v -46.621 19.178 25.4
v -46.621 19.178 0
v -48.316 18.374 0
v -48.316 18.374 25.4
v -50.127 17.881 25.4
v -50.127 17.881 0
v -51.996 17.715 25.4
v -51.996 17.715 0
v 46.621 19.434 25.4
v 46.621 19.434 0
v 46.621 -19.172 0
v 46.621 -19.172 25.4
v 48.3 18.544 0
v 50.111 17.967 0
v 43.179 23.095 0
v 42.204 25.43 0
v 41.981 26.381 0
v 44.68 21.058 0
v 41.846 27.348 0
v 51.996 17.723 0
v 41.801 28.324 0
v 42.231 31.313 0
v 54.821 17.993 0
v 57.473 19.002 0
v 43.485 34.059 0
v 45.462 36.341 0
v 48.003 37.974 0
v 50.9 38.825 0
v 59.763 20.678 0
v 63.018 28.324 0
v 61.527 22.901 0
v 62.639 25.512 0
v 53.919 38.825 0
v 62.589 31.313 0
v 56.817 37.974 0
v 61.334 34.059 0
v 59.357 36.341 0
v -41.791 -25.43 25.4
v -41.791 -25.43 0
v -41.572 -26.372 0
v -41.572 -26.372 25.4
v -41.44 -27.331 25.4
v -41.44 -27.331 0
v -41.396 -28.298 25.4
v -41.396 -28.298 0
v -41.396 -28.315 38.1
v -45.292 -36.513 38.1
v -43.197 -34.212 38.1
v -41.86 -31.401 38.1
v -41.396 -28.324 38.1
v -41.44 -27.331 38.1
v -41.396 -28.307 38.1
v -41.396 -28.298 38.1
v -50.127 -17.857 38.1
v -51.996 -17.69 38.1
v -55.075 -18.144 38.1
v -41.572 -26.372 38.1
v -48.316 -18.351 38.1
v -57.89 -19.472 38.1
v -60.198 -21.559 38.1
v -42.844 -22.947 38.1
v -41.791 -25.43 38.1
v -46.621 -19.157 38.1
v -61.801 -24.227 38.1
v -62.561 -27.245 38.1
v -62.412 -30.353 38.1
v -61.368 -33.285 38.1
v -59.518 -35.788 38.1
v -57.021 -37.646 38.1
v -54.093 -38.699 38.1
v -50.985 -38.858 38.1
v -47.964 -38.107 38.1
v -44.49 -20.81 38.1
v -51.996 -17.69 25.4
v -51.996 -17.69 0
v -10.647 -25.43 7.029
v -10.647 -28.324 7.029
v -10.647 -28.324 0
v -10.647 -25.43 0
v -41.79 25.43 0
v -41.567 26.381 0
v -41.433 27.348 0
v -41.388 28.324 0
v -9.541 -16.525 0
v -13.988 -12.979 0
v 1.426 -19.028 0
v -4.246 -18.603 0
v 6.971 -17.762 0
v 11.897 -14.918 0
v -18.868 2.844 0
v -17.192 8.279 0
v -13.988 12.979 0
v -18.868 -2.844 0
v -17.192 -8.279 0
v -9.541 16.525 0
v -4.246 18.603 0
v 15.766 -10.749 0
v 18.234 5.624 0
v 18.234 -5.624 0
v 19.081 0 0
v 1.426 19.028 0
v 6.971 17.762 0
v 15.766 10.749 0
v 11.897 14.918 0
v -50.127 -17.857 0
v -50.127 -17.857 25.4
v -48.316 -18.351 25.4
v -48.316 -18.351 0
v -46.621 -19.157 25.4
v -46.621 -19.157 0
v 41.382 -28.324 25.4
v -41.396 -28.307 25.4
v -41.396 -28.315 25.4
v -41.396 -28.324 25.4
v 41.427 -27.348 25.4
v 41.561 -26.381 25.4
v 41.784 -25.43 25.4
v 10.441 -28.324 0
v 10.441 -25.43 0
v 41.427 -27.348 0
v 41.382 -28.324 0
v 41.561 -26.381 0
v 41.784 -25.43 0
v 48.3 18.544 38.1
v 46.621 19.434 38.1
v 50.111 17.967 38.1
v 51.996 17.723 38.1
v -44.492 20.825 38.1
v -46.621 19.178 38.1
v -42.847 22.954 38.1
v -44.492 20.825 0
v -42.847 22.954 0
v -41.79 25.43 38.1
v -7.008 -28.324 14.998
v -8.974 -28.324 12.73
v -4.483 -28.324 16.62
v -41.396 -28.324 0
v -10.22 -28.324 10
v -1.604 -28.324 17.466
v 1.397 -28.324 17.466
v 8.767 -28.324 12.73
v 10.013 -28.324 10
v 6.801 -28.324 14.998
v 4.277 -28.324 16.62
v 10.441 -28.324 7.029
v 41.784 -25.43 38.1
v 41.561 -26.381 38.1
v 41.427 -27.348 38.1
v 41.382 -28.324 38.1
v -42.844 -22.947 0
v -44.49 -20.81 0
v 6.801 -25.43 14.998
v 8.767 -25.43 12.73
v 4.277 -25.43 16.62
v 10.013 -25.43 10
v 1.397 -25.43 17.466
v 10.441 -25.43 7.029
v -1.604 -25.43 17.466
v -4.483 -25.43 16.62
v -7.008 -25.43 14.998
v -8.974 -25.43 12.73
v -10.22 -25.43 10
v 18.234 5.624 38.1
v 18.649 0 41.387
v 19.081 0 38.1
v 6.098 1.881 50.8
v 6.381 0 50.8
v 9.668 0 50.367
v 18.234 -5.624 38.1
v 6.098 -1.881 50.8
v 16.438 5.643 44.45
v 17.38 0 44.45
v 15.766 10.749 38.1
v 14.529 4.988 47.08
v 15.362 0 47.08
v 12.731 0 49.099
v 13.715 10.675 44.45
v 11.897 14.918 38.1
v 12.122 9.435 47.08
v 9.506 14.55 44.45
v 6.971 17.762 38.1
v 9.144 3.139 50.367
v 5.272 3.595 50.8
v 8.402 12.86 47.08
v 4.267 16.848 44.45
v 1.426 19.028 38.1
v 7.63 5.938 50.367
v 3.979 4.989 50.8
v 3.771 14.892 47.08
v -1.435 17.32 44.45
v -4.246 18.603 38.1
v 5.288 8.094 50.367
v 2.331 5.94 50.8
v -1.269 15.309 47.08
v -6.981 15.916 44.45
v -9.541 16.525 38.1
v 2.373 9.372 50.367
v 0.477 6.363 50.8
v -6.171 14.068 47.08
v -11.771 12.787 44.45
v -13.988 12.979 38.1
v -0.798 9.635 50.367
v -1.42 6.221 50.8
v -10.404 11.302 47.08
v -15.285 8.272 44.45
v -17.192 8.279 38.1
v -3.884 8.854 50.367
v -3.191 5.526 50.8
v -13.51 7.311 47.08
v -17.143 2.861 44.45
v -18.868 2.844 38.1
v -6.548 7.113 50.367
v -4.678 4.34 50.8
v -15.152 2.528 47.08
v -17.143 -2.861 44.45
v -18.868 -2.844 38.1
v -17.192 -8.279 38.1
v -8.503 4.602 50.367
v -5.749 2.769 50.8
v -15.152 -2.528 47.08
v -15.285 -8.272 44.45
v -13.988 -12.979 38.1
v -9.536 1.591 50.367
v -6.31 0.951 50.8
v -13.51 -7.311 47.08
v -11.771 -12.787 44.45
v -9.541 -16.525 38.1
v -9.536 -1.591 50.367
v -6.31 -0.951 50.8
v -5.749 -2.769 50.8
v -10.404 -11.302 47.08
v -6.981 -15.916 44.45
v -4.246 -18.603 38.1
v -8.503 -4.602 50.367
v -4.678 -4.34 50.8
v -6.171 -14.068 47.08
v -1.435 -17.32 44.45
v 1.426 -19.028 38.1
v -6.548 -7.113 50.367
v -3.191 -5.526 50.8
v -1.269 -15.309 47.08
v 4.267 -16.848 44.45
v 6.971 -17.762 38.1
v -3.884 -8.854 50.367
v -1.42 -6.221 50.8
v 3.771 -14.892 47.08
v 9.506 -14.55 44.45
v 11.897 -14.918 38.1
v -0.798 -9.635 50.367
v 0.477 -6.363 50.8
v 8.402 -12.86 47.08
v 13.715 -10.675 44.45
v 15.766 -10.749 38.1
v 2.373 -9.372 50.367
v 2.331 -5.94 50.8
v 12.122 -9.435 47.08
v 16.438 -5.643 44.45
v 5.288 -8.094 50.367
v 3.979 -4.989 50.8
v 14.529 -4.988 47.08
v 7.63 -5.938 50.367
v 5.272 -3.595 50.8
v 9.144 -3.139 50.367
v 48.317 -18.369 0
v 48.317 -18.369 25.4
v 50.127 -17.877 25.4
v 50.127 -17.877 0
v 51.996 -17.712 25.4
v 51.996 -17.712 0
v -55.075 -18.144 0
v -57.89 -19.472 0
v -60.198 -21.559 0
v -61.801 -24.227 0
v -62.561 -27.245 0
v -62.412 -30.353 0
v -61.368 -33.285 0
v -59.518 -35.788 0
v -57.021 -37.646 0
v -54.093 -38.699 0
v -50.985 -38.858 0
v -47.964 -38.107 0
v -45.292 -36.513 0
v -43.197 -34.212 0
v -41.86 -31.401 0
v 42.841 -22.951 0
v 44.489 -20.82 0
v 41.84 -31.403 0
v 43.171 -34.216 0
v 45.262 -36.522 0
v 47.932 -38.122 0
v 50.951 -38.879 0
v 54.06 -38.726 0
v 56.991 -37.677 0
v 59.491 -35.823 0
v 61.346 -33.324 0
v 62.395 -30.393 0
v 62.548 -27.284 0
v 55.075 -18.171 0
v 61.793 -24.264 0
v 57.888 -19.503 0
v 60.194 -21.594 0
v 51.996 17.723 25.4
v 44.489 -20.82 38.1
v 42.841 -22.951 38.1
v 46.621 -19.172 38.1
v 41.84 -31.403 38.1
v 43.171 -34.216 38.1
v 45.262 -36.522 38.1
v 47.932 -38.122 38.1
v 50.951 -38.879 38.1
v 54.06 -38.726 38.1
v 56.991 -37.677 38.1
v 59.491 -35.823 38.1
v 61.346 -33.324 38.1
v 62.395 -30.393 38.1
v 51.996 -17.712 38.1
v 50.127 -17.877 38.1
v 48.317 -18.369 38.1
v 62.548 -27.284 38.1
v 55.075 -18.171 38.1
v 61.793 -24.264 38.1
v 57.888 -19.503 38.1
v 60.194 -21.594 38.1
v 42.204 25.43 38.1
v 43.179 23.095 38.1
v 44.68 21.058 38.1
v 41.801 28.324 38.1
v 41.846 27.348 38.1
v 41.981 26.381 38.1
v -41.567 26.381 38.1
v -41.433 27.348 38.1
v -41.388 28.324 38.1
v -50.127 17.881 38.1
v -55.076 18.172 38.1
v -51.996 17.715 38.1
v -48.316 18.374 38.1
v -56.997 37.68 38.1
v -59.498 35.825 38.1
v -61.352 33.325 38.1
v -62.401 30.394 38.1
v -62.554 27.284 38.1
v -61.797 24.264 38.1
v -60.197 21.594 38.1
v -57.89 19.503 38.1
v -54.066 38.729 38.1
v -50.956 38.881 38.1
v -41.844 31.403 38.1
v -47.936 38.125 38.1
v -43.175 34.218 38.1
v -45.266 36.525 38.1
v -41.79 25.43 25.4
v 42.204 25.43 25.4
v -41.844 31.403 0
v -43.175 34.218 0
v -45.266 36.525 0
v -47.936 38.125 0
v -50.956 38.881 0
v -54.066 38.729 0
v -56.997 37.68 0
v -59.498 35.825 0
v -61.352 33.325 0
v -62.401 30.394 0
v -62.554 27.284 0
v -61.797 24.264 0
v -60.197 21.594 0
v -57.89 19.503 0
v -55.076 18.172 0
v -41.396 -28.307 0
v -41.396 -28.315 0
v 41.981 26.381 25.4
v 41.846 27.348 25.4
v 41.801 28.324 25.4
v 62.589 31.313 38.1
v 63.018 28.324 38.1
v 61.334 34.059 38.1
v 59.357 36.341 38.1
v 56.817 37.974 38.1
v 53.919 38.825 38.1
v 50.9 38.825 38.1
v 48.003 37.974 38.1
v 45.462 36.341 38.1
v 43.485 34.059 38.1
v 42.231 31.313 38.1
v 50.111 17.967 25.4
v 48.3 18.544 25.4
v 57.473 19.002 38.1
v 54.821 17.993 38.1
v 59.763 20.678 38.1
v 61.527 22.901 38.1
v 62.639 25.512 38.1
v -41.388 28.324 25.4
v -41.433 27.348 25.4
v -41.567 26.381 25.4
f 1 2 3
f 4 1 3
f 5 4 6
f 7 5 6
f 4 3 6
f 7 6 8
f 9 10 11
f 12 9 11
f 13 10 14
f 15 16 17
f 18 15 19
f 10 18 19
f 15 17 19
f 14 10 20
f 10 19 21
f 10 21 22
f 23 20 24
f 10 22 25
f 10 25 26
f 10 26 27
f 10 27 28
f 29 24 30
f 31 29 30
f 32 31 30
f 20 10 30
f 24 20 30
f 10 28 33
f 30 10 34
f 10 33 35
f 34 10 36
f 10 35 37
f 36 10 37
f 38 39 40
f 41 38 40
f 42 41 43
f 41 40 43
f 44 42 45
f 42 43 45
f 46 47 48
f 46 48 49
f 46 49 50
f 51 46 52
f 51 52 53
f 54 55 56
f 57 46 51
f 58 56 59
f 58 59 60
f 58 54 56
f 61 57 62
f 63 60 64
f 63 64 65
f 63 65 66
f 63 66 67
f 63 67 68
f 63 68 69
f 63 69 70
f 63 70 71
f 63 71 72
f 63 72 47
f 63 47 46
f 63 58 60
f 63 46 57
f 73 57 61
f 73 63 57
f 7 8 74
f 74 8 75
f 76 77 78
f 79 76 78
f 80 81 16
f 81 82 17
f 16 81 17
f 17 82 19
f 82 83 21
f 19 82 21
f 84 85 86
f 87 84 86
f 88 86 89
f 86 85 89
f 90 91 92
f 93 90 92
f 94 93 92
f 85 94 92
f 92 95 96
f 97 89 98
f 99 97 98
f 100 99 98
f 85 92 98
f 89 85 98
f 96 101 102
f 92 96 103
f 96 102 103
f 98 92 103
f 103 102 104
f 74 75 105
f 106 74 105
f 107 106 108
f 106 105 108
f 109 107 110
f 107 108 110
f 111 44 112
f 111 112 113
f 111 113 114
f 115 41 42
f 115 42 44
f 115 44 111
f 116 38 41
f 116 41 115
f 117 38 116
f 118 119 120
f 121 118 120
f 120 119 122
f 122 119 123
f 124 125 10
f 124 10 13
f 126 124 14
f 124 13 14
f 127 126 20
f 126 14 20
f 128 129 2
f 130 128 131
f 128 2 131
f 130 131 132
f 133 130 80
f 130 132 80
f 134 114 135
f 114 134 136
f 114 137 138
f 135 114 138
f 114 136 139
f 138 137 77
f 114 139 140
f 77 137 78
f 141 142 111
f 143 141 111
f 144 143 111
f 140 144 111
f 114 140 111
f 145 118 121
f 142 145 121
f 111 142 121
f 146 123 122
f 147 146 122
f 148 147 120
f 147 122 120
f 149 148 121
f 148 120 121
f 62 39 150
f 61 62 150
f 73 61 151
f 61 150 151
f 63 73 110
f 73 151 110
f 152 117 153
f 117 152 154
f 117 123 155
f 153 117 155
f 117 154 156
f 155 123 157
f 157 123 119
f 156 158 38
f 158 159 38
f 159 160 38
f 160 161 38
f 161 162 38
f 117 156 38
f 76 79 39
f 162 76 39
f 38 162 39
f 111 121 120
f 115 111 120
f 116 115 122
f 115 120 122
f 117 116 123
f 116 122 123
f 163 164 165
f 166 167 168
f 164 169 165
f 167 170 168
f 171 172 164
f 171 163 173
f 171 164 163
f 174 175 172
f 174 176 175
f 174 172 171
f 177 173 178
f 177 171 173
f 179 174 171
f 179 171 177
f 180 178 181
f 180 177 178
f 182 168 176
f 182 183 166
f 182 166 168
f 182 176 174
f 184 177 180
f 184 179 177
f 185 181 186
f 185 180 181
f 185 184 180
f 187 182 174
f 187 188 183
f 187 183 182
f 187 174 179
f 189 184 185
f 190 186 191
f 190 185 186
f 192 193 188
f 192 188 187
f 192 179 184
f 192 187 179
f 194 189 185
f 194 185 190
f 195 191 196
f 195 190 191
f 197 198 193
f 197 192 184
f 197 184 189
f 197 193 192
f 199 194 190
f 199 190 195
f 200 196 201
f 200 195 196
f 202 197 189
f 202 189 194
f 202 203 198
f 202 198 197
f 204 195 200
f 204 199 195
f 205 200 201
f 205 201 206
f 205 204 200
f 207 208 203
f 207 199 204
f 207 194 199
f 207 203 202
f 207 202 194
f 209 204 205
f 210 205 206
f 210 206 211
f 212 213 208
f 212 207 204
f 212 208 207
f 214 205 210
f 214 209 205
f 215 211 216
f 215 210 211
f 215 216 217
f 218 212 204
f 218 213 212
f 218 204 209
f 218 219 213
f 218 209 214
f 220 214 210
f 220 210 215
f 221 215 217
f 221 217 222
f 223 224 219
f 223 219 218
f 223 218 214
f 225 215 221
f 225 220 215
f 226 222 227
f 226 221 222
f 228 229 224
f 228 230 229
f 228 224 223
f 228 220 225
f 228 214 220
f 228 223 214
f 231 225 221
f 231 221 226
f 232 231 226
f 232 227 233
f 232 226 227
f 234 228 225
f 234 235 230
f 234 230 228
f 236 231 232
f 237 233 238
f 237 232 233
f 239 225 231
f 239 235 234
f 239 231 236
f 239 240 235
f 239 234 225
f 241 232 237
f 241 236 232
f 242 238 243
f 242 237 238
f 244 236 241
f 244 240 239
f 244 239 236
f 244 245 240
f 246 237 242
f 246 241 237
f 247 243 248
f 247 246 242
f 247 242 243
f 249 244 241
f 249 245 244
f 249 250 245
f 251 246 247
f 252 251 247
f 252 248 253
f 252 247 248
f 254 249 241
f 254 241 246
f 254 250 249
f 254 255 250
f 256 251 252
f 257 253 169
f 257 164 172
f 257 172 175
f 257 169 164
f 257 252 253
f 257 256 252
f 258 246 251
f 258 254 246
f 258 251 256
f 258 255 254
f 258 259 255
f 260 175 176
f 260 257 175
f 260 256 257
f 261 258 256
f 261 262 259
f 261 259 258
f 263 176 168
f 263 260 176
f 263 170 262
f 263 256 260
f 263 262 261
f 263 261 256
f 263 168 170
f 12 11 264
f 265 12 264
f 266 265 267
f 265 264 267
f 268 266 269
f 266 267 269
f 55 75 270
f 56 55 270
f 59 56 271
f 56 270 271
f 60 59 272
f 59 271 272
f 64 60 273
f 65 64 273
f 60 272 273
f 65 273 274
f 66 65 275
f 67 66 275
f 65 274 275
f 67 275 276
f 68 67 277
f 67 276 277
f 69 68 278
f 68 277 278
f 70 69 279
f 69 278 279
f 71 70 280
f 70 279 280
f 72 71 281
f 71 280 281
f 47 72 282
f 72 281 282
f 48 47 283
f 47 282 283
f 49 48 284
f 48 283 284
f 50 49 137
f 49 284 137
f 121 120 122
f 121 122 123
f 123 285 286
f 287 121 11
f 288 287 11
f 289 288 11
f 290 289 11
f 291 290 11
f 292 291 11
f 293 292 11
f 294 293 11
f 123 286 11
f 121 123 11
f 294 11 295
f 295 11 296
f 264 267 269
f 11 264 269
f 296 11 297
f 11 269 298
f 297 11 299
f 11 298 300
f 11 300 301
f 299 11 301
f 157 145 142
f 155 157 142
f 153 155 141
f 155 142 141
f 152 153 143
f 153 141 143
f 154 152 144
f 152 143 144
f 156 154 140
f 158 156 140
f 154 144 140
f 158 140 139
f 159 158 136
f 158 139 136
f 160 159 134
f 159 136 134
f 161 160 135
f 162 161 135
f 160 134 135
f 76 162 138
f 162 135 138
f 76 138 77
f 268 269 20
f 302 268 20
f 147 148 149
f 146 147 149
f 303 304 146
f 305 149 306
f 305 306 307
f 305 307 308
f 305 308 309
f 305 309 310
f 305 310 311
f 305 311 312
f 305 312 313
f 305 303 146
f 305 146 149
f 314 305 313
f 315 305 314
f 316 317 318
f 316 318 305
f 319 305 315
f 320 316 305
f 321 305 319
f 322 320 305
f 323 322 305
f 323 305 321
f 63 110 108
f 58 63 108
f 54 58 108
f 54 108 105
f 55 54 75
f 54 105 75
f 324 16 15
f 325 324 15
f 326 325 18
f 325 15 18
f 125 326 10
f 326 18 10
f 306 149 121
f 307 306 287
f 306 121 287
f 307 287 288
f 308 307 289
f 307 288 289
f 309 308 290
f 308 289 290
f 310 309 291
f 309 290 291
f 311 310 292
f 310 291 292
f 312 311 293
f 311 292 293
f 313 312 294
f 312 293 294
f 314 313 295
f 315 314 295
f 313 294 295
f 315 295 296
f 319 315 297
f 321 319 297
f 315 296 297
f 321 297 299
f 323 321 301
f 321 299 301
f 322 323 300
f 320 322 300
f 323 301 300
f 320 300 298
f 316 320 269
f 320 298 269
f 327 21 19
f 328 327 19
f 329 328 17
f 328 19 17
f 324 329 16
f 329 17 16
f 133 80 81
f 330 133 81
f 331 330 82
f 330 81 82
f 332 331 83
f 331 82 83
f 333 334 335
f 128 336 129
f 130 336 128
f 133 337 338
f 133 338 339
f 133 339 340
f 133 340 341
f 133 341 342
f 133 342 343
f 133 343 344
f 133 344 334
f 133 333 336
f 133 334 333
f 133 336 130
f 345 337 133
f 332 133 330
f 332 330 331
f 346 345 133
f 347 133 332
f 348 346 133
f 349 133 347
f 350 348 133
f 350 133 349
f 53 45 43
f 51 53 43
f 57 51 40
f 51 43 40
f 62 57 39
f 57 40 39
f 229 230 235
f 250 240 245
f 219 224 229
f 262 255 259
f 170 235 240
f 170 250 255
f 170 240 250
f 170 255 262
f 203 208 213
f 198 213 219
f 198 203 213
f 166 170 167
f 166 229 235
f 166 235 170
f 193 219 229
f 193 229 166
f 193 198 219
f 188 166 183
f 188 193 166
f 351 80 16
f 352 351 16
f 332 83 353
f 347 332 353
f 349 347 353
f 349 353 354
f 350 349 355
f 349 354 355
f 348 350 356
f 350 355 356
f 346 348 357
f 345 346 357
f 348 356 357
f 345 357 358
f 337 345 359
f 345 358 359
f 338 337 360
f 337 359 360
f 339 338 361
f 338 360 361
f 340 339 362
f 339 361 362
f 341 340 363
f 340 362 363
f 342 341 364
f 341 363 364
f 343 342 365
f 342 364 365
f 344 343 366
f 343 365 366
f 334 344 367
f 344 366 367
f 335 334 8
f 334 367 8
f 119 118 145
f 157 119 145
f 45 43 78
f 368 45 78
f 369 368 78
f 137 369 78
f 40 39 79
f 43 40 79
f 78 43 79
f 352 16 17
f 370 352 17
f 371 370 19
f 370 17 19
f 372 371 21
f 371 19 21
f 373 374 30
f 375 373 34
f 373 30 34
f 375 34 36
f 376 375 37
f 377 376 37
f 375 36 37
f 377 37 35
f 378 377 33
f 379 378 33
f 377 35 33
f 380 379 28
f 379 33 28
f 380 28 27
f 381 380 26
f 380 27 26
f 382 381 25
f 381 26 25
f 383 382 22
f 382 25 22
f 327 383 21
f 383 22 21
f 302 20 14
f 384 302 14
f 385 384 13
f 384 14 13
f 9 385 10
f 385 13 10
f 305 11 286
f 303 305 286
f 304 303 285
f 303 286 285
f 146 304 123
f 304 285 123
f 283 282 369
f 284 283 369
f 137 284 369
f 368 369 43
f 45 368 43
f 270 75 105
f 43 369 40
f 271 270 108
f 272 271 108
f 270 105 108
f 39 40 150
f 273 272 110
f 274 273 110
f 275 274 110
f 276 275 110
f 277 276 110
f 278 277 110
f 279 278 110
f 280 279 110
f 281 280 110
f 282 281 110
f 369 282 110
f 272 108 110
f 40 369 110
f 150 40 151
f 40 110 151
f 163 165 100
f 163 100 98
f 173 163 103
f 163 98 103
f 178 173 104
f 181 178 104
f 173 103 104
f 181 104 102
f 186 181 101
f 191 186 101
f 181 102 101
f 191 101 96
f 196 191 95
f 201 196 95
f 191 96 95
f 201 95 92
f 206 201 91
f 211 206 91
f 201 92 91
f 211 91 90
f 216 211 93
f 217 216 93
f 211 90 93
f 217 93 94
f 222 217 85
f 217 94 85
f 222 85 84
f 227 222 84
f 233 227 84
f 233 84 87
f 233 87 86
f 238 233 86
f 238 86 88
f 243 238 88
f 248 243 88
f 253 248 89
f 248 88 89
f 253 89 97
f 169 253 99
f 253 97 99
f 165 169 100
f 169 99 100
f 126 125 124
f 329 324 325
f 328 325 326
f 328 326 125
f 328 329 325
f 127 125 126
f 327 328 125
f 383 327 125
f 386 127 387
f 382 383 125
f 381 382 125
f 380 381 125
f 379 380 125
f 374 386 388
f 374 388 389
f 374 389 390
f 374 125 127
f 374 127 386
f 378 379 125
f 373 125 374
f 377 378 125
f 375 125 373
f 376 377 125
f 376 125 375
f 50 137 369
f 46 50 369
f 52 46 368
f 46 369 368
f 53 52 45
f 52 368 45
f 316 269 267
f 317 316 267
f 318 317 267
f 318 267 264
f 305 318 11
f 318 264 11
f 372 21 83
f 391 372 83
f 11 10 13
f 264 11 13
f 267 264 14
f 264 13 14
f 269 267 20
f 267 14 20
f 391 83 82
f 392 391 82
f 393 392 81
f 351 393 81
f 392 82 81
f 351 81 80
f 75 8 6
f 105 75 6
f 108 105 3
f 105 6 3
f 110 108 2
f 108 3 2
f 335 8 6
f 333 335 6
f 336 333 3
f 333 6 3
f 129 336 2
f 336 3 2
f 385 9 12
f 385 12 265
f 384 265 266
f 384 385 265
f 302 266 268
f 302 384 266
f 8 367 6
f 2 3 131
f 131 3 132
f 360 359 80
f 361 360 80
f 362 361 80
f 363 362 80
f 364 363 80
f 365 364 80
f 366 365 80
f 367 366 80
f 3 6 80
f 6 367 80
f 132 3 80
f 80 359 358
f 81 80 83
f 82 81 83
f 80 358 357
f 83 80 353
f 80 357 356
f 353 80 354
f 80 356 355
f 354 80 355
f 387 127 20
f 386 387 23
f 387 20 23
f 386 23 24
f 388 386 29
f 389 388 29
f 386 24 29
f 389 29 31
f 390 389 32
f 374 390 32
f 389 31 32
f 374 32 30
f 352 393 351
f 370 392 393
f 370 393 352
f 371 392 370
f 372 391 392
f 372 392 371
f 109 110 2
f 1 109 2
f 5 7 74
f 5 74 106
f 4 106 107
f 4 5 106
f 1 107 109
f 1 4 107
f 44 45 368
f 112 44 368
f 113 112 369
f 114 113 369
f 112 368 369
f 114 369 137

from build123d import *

# Parameters (mm, degrees)
F1_DEPTH = 25.4
F2_DEPTH = 38.1
F0_R     = 19.0813240556
F3_DEPTH = 50.8
F5_DEPTH = 25.4
F6_R     = 12.7


with BuildPart() as f1:
    # F0 (on Top) → F1 (new body)
    with BuildSketch(Plane.XY):
        with BuildLine():
            Line((41.8010411673, 28.3239521086), (-41.3875488453, 28.3239521086))
            ThreePointArc((-41.3875488453, 28.3239521086), (-41.4886521595, 26.8628188405), (-41.7900350118, 25.4295356572))
            Line((-41.7900350118, 25.4295356572), (42.2035273337, 25.4295356572))
            ThreePointArc((42.2035273337, 25.4295356572), (41.9021444815, 26.8628188405), (41.8010411673, 28.3239521086))
        make_face()
    extrude(amount=F1_DEPTH)


with BuildPart() as f1b:
    # F0 (on Top) → F1, piece 2 (new body)
    with BuildSketch(Plane.XY):
        with BuildLine():
            Line((-51.9961640239, 17.7153369301), (-51.9961640239, -17.6895592099))
            ThreePointArc((-51.9961640239, -17.6895592099), (-49.2104219308, -18.0640746947), (-46.6208159924, -19.1570348685))
            Line((-46.6208159924, -19.1570348685), (-46.6208159924, 19.1780049435))
            ThreePointArc((-46.6208159924, 19.1780049435), (-49.2107661987, 18.0875330589), (-51.9961640239, 17.7153369301))
        make_face()
    extrude(amount=F1_DEPTH)


with BuildPart() as f1c:
    # F0 (on Top) → F1, piece 3 (new body)
    with BuildSketch(Plane.XY):
        with BuildLine():
            ThreePointArc((-41.3957258575, -28.2981712371), (-41.3957336891, -28.3110616824), (-41.3957571837, -28.3239521086))
            Line((-41.3957571837, -28.3239521086), (41.3820469809, -28.3239521086))
            ThreePointArc((41.3820469809, -28.3239521086), (41.4827466628, -26.8628475768), (41.7837181231, -25.4295356572))
            Line((41.7837181231, -25.4295356572), (-41.7909358294, -25.4295356572))
            ThreePointArc((-41.7909358294, -25.4295356572), (-41.4949927807, -26.8503054791), (-41.3957258575, -28.2981712371))
        make_face()
    extrude(amount=F1_DEPTH)

    # F4 (on face) → F5 (cut)
    with BuildSketch(Plane.XZ.offset(28.3239521086)):
        with BuildLine():
            Line((-10.6473257765, 7.0293024182), (-10.6473257765, 0))
            Line((-10.6473257765, 0), (10.4405824095, 0))
            Line((10.4405824095, 0), (10.4405824095, 7.0293024182))
            ThreePointArc((10.4405824095, 7.0293024182), (-0.1033716835, 17.5732565112), (-10.6473257765, 7.0293024182))
        make_face()
    extrude(amount=-F5_DEPTH, mode=Mode.SUBTRACT)


with BuildPart() as f1d:
    # F0 (on Top) → F1, piece 4 (new body)
    with BuildSketch(Plane.XY):
        with BuildLine():
            Line((46.6208159924, 19.4339552938), (46.6208159924, -19.1718992682))
            ThreePointArc((46.6208159924, -19.1718992682), (49.210997587, -18.0831005596), (51.9961640239, -17.7124642955))
            Line((51.9961640239, -17.7124642955), (51.9961640239, 17.7233983445))
            ThreePointArc((51.9961640239, 17.7233983445), (49.1927115338, 18.2148481877), (46.6208159924, 19.4339552938))
        make_face()
    extrude(amount=F1_DEPTH)


with BuildPart() as f2:
    # F0 (on Top) → F2 (new body)
    with BuildSketch(Plane.XY):
        with BuildLine():
            ThreePointArc((-41.3875488453, 28.3239521086), (-59.4975877556, 35.8253758404), (-51.9961640239, 17.7153369301))
            ThreePointArc((-51.9961640239, 17.7153369301), (-49.2107661987, 18.0875330589), (-46.6208159924, 19.1780049435))
            ThreePointArc((-46.6208159924, 19.1780049435), (-43.6017601867, 21.8372965586), (-41.7900350118, 25.4295356572))
            ThreePointArc((-41.7900350118, 25.4295356572), (-41.4886521595, 26.8628188405), (-41.3875488453, 28.3239521086))
        make_face()
    extrude(amount=F2_DEPTH)


with BuildPart() as f2b:
    # F0 (on Top) → F2, piece 2 (new body)
    with BuildSketch(Plane.XY):
        with BuildLine():
            ThreePointArc((-51.9961640239, -17.6895592099), (-59.5177610892, -35.7875794321), (-41.3957571837, -28.3239521086))
            ThreePointArc((-41.3957571837, -28.3239521086), (-41.3957336891, -28.3110616824), (-41.3957258575, -28.2981712371))
            ThreePointArc((-41.3957258575, -28.2981712371), (-41.4949927807, -26.8503054791), (-41.7909358294, -25.4295356572))
            ThreePointArc((-41.7909358294, -25.4295356572), (-43.5988592031, -21.8258771182), (-46.6208159924, -19.1570348685))
            ThreePointArc((-46.6208159924, -19.1570348685), (-49.2104219308, -18.0640746947), (-51.9961640239, -17.6895592099))
        make_face()
    extrude(amount=F2_DEPTH)


with BuildPart() as f2c:
    # F0 (on Top) → F2, piece 3 (new body)
    with BuildSketch(Plane.XY):
        with BuildLine():
            ThreePointArc((41.7837181231, -25.4295356572), (41.4827466628, -26.8628475768), (41.3820469809, -28.3239521086))
            ThreePointArc((41.3820469809, -28.3239521086), (51.9920988009, -38.9296931284), (62.5992769487, -28.3210780472))
            ThreePointArc((62.5992769487, -28.3210780472), (59.4940305902, -20.8215999082), (51.9961640239, -17.7124642955))
            ThreePointArc((51.9961640239, -17.7124642955), (49.210997587, -18.0831005596), (46.6208159924, -19.1718992682))
            ThreePointArc((46.6208159924, -19.1718992682), (43.5972956104, -21.8330798569), (41.7837181231, -25.4295356572))
        make_face()
    extrude(amount=F2_DEPTH)


with BuildPart() as f2d:
    # F0 (on Top) → F2, piece 4 (new body)
    with BuildSketch(Plane.XY):
        with BuildLine():
            ThreePointArc((42.2035273337, 25.4295356572), (43.8687836021, 22.0314002589), (46.6208159924, 19.4339552938))
            ThreePointArc((46.6208159924, 19.4339552938), (49.1927115338, 18.2148481877), (51.9961640239, 17.7233983445))
            ThreePointArc((51.9961640239, 17.7233983445), (59.7634354792, 20.6777341896), (63.0182715244, 28.3239521086))
            ThreePointArc((63.0182715244, 28.3239521086), (52.4096563458, 38.9325672872), (41.8010411673, 28.3239521086))
            ThreePointArc((41.8010411673, 28.3239521086), (41.9021444815, 26.8628188405), (42.2035273337, 25.4295356572))
        make_face()
    extrude(amount=F2_DEPTH)


with BuildPart() as f3:
    # F0 (on Top) → F3 (new body)
    with BuildSketch(Plane.XY):
        Circle(F0_R)
    extrude(amount=F3_DEPTH)

    # F6
    f6_edges = [f3.edges().sort_by_distance(p)[0] for p in [
        (-19.081324, 0, 50.8),
    ]]
    fillet(f6_edges, radius=F6_R)


solid = Compound([f1.part, f1b.part, f1c.part, f1d.part, f2.part, f2b.part, f2c.part, f2d.part, f3.part])
